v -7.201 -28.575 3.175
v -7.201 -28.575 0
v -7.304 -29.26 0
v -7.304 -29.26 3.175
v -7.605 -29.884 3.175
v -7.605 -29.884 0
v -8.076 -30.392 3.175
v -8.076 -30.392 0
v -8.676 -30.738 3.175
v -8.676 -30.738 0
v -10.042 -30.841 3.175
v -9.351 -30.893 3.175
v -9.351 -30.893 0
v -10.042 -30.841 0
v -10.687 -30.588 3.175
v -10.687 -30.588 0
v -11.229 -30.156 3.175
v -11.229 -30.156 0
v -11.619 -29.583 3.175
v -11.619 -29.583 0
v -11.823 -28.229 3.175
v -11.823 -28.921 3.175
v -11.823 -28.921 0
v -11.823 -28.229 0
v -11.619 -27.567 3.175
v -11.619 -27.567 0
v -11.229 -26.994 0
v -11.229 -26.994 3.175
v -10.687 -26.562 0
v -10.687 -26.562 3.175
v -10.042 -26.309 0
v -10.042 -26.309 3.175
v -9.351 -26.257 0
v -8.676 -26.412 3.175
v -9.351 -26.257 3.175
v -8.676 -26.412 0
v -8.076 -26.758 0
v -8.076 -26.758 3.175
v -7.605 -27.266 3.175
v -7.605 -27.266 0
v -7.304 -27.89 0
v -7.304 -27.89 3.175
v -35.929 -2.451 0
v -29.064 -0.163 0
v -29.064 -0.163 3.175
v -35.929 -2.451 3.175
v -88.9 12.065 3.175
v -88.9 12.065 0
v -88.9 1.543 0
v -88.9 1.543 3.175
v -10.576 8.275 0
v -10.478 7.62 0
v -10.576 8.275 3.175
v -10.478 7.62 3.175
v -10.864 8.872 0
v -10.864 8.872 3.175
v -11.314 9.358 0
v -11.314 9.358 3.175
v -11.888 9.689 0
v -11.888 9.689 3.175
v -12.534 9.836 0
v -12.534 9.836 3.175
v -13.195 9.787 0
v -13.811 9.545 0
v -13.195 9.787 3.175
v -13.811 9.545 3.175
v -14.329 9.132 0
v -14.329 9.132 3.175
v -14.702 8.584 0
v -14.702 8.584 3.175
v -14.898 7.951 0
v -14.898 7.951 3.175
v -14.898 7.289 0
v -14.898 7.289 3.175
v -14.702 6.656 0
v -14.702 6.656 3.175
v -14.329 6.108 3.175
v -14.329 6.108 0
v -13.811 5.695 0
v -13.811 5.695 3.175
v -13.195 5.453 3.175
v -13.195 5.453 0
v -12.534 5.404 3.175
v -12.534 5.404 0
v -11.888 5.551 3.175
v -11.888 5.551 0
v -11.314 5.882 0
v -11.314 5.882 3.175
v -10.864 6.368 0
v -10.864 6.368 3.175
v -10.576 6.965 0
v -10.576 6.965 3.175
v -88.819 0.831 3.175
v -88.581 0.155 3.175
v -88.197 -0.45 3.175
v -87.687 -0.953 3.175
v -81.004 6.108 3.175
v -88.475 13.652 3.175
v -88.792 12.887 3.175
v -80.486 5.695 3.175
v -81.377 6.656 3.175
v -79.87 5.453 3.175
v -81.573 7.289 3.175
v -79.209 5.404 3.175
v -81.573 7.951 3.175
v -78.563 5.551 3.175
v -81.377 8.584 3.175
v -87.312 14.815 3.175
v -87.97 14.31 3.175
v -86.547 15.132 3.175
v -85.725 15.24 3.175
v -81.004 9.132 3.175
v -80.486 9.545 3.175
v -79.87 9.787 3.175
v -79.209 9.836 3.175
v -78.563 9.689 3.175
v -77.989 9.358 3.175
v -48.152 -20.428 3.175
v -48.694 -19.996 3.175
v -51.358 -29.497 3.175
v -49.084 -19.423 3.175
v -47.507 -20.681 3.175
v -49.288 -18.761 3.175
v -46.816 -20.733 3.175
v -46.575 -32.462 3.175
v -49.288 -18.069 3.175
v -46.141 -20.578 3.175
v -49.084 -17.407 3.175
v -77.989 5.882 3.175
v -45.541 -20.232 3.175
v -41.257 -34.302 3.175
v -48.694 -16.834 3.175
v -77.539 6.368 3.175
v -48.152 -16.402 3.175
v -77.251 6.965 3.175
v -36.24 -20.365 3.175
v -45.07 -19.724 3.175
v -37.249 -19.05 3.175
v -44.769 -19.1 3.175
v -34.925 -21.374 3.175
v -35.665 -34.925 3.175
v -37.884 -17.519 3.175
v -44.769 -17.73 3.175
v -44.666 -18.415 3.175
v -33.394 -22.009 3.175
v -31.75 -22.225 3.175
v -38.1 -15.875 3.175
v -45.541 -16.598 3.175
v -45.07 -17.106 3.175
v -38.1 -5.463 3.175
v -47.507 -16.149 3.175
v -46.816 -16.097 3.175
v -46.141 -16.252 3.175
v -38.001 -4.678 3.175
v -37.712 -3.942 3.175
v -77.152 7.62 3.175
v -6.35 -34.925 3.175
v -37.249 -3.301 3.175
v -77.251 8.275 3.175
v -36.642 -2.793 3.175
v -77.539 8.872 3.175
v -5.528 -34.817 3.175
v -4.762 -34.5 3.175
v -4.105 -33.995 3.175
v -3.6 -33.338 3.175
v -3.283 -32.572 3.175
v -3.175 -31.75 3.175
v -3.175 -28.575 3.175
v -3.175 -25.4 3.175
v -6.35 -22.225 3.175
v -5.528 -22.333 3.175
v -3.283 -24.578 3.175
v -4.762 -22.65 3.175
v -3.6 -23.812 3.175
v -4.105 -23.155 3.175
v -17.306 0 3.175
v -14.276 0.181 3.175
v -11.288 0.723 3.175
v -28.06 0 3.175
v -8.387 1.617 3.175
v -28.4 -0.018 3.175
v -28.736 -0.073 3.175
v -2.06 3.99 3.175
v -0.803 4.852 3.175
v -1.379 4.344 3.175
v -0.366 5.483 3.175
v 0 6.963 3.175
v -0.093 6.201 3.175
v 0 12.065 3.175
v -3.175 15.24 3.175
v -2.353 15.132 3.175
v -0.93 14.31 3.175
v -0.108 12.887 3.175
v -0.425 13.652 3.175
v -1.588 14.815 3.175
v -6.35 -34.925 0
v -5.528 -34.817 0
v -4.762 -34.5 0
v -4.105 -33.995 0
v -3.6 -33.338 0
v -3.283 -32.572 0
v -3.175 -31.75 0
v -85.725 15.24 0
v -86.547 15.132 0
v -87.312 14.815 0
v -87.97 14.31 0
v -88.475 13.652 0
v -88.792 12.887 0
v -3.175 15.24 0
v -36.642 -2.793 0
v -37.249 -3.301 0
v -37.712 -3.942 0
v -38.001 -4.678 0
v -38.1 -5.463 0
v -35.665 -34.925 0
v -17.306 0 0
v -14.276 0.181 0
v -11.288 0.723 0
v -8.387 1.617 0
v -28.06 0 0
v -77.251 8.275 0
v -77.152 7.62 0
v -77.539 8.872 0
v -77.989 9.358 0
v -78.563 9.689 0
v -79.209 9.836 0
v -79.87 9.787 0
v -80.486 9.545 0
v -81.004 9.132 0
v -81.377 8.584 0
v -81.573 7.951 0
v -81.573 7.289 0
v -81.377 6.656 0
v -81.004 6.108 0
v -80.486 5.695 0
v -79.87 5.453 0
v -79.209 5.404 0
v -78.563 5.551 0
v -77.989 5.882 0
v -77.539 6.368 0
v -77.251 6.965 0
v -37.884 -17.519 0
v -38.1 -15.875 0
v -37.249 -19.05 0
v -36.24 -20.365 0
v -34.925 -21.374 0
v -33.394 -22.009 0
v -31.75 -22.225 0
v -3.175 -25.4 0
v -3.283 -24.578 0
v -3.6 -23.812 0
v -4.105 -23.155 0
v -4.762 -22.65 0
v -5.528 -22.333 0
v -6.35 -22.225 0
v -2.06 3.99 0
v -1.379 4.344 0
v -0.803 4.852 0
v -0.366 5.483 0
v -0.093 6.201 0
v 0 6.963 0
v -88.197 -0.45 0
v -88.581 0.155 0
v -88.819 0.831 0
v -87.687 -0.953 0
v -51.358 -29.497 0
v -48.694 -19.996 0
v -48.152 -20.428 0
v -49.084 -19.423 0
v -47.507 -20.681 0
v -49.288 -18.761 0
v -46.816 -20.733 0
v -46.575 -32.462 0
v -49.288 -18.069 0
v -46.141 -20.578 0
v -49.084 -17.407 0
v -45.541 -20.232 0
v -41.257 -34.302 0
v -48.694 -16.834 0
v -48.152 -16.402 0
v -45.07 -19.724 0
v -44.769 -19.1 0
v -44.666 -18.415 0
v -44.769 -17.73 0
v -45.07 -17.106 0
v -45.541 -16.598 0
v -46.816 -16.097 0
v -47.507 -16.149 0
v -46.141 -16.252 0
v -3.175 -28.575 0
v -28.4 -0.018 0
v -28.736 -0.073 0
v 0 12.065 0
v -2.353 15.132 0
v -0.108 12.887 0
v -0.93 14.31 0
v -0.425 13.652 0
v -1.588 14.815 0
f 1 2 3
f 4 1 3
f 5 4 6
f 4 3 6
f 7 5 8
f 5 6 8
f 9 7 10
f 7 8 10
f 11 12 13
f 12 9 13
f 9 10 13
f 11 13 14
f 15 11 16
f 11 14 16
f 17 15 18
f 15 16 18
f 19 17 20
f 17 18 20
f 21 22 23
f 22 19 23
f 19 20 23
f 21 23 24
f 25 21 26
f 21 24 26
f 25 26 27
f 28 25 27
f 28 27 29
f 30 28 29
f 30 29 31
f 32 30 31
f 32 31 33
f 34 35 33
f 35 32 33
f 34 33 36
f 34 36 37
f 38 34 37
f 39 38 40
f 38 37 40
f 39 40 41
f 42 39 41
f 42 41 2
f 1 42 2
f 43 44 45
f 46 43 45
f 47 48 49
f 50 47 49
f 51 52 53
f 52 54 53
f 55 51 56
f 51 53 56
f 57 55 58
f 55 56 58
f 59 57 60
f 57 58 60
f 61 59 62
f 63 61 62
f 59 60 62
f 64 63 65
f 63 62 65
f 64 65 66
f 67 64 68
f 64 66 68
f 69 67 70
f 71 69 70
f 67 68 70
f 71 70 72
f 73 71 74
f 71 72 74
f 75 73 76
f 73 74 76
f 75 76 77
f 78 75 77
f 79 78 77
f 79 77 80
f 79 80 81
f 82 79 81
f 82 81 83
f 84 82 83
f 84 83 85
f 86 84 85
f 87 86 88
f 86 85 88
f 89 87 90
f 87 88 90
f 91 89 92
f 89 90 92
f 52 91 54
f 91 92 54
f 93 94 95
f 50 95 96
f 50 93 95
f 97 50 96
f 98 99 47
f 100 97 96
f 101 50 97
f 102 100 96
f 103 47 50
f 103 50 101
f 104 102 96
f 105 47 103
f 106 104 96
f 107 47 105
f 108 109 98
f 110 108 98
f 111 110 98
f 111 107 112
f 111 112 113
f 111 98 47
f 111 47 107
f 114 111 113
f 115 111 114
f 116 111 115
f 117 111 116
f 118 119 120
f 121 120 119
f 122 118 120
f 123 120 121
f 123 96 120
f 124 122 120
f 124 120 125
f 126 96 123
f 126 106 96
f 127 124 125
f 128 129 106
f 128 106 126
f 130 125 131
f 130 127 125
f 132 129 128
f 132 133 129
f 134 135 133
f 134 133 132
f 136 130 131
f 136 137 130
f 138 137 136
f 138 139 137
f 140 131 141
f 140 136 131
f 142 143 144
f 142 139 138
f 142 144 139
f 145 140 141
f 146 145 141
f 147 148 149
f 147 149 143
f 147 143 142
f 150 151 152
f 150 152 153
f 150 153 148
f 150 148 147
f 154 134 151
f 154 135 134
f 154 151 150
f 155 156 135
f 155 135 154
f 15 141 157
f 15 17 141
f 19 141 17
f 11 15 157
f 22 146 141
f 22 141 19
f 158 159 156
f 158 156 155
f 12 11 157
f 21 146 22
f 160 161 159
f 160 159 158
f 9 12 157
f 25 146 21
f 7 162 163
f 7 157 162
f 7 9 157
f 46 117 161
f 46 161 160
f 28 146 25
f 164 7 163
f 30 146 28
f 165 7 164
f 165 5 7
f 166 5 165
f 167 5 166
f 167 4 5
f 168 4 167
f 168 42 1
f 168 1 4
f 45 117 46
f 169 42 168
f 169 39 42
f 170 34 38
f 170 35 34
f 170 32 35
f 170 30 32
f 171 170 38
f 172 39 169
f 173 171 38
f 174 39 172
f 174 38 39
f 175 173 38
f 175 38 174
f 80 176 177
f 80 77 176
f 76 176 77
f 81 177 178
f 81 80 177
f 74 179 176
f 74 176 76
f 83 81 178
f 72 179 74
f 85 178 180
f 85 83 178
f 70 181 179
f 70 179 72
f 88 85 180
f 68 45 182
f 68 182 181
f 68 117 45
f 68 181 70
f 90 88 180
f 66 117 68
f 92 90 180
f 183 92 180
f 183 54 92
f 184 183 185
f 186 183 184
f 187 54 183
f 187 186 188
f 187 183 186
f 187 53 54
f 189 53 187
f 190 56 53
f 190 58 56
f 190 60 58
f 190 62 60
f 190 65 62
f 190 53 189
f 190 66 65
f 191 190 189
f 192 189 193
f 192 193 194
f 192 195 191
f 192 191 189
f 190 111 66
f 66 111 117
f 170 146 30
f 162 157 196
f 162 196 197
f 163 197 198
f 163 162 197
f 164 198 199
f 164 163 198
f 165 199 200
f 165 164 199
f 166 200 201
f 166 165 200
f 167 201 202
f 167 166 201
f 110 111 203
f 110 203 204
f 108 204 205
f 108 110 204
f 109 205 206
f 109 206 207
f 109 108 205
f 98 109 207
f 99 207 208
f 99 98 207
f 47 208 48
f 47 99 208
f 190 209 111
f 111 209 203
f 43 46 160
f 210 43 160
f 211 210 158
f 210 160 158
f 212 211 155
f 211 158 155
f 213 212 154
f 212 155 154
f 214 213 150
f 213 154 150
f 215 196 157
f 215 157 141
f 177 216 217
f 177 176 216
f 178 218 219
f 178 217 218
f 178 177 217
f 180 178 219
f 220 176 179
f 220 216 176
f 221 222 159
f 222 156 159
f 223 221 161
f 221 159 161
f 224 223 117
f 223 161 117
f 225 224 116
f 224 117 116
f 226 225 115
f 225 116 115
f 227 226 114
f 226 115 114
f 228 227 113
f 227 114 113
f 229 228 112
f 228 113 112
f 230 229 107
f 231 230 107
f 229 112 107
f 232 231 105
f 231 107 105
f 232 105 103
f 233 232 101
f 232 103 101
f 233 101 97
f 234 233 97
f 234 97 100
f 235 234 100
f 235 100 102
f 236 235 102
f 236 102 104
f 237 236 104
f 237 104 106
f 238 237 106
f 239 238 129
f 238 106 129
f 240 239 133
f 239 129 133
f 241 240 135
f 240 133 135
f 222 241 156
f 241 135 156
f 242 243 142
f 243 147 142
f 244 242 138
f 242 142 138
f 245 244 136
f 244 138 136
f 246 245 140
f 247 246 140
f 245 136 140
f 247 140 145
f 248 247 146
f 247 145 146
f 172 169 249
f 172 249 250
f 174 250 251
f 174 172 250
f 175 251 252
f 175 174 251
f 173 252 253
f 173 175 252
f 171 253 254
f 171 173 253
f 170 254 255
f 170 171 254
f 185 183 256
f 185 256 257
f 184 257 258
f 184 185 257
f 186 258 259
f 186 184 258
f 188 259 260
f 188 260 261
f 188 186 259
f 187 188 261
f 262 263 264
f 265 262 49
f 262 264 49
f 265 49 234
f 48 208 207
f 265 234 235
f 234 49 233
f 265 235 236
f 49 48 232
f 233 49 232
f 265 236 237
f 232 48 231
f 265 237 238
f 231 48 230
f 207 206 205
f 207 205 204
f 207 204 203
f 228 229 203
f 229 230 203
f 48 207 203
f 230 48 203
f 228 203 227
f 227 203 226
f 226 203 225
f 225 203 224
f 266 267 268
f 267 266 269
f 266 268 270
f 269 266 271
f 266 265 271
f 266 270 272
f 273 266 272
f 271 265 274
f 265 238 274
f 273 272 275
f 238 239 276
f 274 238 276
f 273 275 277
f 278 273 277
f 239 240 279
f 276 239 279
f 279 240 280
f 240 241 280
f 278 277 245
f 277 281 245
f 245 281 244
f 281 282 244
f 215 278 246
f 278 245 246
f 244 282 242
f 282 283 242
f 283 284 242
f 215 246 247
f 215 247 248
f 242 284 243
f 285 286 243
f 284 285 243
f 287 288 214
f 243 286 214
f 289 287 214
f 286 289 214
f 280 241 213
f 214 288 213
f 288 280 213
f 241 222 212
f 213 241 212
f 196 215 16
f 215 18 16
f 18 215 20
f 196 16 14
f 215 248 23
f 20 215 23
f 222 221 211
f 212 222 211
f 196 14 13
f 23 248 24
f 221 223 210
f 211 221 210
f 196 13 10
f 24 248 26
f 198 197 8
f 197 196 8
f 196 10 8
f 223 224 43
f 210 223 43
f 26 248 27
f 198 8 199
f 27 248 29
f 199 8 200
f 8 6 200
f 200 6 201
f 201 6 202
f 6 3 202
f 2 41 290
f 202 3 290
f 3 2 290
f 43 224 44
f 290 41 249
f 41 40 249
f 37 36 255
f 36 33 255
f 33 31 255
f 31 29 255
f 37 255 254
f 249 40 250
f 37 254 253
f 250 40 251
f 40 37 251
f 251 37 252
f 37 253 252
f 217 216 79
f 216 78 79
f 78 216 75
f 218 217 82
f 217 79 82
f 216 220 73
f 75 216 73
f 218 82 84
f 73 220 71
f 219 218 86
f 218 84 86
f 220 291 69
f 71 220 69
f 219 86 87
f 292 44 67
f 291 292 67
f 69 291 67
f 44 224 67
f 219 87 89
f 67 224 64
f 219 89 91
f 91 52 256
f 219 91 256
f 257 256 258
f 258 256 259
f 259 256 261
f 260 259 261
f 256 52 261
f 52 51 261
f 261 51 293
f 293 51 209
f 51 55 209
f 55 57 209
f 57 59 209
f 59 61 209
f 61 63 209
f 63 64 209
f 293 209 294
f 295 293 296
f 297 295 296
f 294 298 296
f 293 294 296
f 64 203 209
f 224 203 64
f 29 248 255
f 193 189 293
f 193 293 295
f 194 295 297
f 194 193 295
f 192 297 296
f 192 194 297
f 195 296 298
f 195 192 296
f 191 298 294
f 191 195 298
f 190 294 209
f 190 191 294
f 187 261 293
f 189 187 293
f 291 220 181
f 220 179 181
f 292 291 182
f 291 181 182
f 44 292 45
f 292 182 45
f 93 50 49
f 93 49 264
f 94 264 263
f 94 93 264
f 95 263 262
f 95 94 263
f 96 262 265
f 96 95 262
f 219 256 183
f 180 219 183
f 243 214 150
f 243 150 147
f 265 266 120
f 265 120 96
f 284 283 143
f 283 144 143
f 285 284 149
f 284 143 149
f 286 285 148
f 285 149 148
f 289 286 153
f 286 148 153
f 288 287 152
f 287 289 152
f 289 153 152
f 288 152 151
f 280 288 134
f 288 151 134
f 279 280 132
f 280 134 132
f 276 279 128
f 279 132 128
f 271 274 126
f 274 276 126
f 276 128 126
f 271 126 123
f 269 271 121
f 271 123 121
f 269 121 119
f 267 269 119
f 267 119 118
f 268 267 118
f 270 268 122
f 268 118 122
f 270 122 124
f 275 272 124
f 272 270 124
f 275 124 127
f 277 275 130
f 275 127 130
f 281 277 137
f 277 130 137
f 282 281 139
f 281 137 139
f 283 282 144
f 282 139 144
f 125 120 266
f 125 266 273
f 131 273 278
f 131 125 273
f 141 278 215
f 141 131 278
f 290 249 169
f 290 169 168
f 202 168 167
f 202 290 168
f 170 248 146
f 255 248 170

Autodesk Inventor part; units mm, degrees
ref_plane "YZ Plane" through (0, 0, 0) normal (1, 0, 0) x (0, 1, 0)
ref_plane "XZ Plane" through (0, 0, 0) normal (0, 1, 0) x (-1, 0, 0)
ref_plane "XY Plane" through (0, 0, 0) normal (0, 0, 1) x (1, 0, 0)
sketch "Sketch1" plane through (0, 0, 0) normal (0, 0, 1) x (1, 0, 0)
  line L0 (0, 0) -> (-88.9, 0)
  line L1 (0, 0) -> (0, 15.24)
  line L2 (0, 15.24) -> (-88.9, 15.24)
  line L3 (-88.9, 15.24) -> (-88.9, 0)
  line L4 (0, 0) -> (-44.45, 0)
  line L5 (-44.45, 0) -> (-44.45, -22.225)
  line L6 (0, 0) -> (-31.75, 0)
  line L7 (-31.75, 0) -> (-31.75, -22.225)
  line L8 (-44.45, -22.225) -> (-31.75, -22.225)
  line L9 (-31.75, -22.225) -> (0, -22.225)
  line L10 (0, -22.225) -> (0, -34.925)
  line L11 (0, -34.925) -> (-44.45, -34.925)
  line L12 (-44.45, -34.925) -> (-88.9, 0)
  line L13 (0, -28.575) -> (-9.525, -28.575)
  circle A0 centre (-9.525, -28.575) radius 2.3241
  line L14 (-49.0828, -48.0247) -> (-25.6113, -57.7328)
  line L15 (-44.45, 0) -> (-38.1, 0)
  line L16 (-38.1, 0) -> (-38.1, -22.225)
  line L17 (0, -28.575) -> (-3.175, -28.575)
  line L18 (-3.175, -22.225) -> (-3.175, -34.925)
  dimension "d0" = 88.9
  dimension "d1" = 15.24
  dimension "d2" = 44.45
  dimension "d3" = 22.225
  dimension "d4" = 31.75
  dimension "d5" = 12.7
  dimension "d6" = 9.525
  dimension "d7" = 4.6482
  dimension "d8" = 25.4
  dimension "d13" = 3.175
extrude "Extrusion1" add sketch "Sketch1" along normal blind 3.175
extrude "Extrusion2" cut sketch "Sketch1" along normal blind 3.175 contours L7 L8 L16 L0
extrude "Extrusion3" cut sketch "Sketch1" along normal blind 3.175 contours L9 L10 L13 L18 | L13 L10 L11 L18
fillet "Fillet1" radius 3.175 2 edges at (-3.175, -22.225, 1.5875) (-3.175, -34.925, 1.5875)
chamfer "Chamfer1" distance 3.175 distance2 9.525 1 edges at (-38.1, 0, 1.5875) measured on face at (-38.1, -7.4083, 2.1167)
fillet "Fillet2" radius 3.175 2 edges at (-38.1, -3.175, 1.5875) (-28.575, 0, 1.5875)
fillet "Fillet3" radius 6.35 1 edges at (-38.1, -22.225, 1.5875)
fillet "Fillet4" radius 25.4 1 edges at (-44.45, -34.925, 1.5875)
sketch "Sketch2" plane through (0, 0, 3.175) normal (0, 0, 1) x (1, 0, 0)
  circle A0 centre (-9.525, -28.575) radius 2.3241 projected
  arc A1 (-51.3577, -29.4975) -> (-35.6651, -34.925) centre (-35.6651, -9.525) ccw projected
  line L0 (-35.6651, -34.925) -> (-6.35, -34.925) projected
  arc A2 (-6.35, -34.925) -> (-3.175, -31.75) centre (-6.35, -31.75) ccw projected
  line L1 (-3.175, -31.75) -> (-3.175, -25.4) projected
  arc A3 (-3.175, -25.4) -> (-6.35, -22.225) centre (-6.35, -25.4) ccw projected
  line L2 (-6.35, -22.225) -> (-31.75, -22.225) projected
  arc A4 (-38.1, -15.875) -> (-31.75, -22.225) centre (-31.75, -15.875) ccw projected
  line L3 (-38.1, -15.875) -> (-38.1, -5.4634) projected
  arc A5 (-35.929, -2.4513) -> (-38.1, -5.4634) centre (-34.925, -5.4634) ccw projected
  line L4 (-29.0638, -0.1629) -> (-35.929, -2.4513) projected
  arc A6 (-28.0598, 0) -> (-29.0638, -0.1629) centre (-28.0598, -3.175) ccw projected
  line L5 (-28.0598, 0) -> (0, 0) projected
  line L6 (0, 0) -> (0, 15.24) projected
  line L7 (0, 15.24) -> (-88.9, 15.24) projected
  line L8 (-88.9, 15.24) -> (-88.9, 0) projected
  line L9 (-88.9, 0) -> (-51.3577, -29.4975) projected
  line L10 (0, 0) -> (0, 15.24) projected
  line L11 (0, 7.62) -> (-12.7, 7.62)
  circle A7 centre (-12.7, 7.62) radius 2.2225
  line L12 (-88.9, 7.62) -> (-79.375, 7.62)
  circle A8 centre (-79.375, 7.62) radius 2.2225
  dimension "d23" = 4.445
  dimension "d24" = 9.525
  dimension "d25" = 4.445
  dimension "d28" = 12.7
extrude "Extrusion4" cut sketch "Sketch2" against normal blind 3.175 contours A7 | A8
chamfer "Chamfer2" distance 12.7 distance2 4.7625 1 edges at (0, 0, 1.5875) measured on face at (-18.7065, 0, 2.1167)
fillet "Fillet5" radius 25.4 1 edges at (-12.7, 0, 1.5875)
fillet "Fillet6" radius 3.175 1 edges at (0, 4.7625, 1.5875)
fillet "Fillet7" radius 3.175 1 edges at (0, 15.24, 1.5875)
fillet "Fillet8" radius 3.175 2 edges at (-88.9, 15.24, 1.5875) (-88.9, 0, 1.5875)
sketch "Sketch3" plane through (0, 0, 3.175) normal (0, 0, 1) x (1, 0, 0)
  arc A0 (-88.9, 1.5432) -> (-87.6866, -0.9534) centre (-85.725, 1.5432) ccw projected
  line L0 (-87.6866, -0.9534) -> (-51.3577, -29.4975) projected
  arc A1 (-51.3577, -29.4975) -> (-35.6651, -34.925) centre (-35.6651, -9.525) ccw projected
  line L1 (-35.6651, -34.925) -> (-6.35, -34.925) projected
  arc A2 (-6.35, -34.925) -> (-3.175, -31.75) centre (-6.35, -31.75) ccw projected
  line L2 (-3.175, -31.75) -> (-3.175, -25.4) projected
  arc A3 (-3.175, -25.4) -> (-6.35, -22.225) centre (-6.35, -25.4) ccw projected
  line L3 (-6.35, -22.225) -> (-31.75, -22.225) projected
  arc A4 (-38.1, -15.875) -> (-31.75, -22.225) centre (-31.75, -15.875) ccw projected
  line L4 (-38.1, -15.875) -> (-38.1, -5.4634) projected
  arc A5 (-35.929, -2.4513) -> (-38.1, -5.4634) centre (-34.925, -5.4634) ccw projected
  line L5 (-29.0638, -0.1629) -> (-35.929, -2.4513) projected
  arc A6 (-28.0598, 0) -> (-29.0638, -0.1629) centre (-28.0598, -3.175) ccw projected
  line L6 (-28.0598, 0) -> (-17.3059, 0) projected
  arc A7 (-17.3059, 0) -> (-8.3874, 1.6172) centre (-17.3059, 25.4) ccw projected
  line L7 (-2.0602, 3.9899) -> (-8.3874, 1.6172) projected
  arc A8 (-2.0602, 3.9899) -> (0, 6.9628) centre (-3.175, 6.9628) ccw projected
  line L8 (0, 6.9628) -> (0, 12.065) projected
  arc A9 (0, 12.065) -> (-3.175, 15.24) centre (-3.175, 12.065) ccw projected
  line L9 (-3.175, 15.24) -> (-85.725, 15.24) projected
  arc A10 (-85.725, 15.24) -> (-88.9, 12.065) centre (-85.725, 12.065) ccw projected
  line L10 (-88.9, 12.065) -> (-88.9, 1.5432) projected
  circle A11 centre (-12.7, 7.62) radius 2.2225 projected
  circle A12 centre (-79.375, 7.62) radius 2.2225 projected
  circle A13 centre (-9.525, -28.575) radius 2.3241 projected
  line L11 (-9.525, -28.575) -> (-46.99, -28.575)
  line L12 (-46.99, -28.575) -> (-46.99, -18.415)
  circle A14 centre (-46.99, -18.415) radius 2.3241
  point P0 (0, 0)
  dimension "d36" = 37.465
  dimension "d37" = 10.16
  dimension "d38" = 4.6482
extrude "Extrusion5" cut sketch "Sketch3" against normal blind 25.4 contours A14
properties part number "Goal Jaw Chassis"
